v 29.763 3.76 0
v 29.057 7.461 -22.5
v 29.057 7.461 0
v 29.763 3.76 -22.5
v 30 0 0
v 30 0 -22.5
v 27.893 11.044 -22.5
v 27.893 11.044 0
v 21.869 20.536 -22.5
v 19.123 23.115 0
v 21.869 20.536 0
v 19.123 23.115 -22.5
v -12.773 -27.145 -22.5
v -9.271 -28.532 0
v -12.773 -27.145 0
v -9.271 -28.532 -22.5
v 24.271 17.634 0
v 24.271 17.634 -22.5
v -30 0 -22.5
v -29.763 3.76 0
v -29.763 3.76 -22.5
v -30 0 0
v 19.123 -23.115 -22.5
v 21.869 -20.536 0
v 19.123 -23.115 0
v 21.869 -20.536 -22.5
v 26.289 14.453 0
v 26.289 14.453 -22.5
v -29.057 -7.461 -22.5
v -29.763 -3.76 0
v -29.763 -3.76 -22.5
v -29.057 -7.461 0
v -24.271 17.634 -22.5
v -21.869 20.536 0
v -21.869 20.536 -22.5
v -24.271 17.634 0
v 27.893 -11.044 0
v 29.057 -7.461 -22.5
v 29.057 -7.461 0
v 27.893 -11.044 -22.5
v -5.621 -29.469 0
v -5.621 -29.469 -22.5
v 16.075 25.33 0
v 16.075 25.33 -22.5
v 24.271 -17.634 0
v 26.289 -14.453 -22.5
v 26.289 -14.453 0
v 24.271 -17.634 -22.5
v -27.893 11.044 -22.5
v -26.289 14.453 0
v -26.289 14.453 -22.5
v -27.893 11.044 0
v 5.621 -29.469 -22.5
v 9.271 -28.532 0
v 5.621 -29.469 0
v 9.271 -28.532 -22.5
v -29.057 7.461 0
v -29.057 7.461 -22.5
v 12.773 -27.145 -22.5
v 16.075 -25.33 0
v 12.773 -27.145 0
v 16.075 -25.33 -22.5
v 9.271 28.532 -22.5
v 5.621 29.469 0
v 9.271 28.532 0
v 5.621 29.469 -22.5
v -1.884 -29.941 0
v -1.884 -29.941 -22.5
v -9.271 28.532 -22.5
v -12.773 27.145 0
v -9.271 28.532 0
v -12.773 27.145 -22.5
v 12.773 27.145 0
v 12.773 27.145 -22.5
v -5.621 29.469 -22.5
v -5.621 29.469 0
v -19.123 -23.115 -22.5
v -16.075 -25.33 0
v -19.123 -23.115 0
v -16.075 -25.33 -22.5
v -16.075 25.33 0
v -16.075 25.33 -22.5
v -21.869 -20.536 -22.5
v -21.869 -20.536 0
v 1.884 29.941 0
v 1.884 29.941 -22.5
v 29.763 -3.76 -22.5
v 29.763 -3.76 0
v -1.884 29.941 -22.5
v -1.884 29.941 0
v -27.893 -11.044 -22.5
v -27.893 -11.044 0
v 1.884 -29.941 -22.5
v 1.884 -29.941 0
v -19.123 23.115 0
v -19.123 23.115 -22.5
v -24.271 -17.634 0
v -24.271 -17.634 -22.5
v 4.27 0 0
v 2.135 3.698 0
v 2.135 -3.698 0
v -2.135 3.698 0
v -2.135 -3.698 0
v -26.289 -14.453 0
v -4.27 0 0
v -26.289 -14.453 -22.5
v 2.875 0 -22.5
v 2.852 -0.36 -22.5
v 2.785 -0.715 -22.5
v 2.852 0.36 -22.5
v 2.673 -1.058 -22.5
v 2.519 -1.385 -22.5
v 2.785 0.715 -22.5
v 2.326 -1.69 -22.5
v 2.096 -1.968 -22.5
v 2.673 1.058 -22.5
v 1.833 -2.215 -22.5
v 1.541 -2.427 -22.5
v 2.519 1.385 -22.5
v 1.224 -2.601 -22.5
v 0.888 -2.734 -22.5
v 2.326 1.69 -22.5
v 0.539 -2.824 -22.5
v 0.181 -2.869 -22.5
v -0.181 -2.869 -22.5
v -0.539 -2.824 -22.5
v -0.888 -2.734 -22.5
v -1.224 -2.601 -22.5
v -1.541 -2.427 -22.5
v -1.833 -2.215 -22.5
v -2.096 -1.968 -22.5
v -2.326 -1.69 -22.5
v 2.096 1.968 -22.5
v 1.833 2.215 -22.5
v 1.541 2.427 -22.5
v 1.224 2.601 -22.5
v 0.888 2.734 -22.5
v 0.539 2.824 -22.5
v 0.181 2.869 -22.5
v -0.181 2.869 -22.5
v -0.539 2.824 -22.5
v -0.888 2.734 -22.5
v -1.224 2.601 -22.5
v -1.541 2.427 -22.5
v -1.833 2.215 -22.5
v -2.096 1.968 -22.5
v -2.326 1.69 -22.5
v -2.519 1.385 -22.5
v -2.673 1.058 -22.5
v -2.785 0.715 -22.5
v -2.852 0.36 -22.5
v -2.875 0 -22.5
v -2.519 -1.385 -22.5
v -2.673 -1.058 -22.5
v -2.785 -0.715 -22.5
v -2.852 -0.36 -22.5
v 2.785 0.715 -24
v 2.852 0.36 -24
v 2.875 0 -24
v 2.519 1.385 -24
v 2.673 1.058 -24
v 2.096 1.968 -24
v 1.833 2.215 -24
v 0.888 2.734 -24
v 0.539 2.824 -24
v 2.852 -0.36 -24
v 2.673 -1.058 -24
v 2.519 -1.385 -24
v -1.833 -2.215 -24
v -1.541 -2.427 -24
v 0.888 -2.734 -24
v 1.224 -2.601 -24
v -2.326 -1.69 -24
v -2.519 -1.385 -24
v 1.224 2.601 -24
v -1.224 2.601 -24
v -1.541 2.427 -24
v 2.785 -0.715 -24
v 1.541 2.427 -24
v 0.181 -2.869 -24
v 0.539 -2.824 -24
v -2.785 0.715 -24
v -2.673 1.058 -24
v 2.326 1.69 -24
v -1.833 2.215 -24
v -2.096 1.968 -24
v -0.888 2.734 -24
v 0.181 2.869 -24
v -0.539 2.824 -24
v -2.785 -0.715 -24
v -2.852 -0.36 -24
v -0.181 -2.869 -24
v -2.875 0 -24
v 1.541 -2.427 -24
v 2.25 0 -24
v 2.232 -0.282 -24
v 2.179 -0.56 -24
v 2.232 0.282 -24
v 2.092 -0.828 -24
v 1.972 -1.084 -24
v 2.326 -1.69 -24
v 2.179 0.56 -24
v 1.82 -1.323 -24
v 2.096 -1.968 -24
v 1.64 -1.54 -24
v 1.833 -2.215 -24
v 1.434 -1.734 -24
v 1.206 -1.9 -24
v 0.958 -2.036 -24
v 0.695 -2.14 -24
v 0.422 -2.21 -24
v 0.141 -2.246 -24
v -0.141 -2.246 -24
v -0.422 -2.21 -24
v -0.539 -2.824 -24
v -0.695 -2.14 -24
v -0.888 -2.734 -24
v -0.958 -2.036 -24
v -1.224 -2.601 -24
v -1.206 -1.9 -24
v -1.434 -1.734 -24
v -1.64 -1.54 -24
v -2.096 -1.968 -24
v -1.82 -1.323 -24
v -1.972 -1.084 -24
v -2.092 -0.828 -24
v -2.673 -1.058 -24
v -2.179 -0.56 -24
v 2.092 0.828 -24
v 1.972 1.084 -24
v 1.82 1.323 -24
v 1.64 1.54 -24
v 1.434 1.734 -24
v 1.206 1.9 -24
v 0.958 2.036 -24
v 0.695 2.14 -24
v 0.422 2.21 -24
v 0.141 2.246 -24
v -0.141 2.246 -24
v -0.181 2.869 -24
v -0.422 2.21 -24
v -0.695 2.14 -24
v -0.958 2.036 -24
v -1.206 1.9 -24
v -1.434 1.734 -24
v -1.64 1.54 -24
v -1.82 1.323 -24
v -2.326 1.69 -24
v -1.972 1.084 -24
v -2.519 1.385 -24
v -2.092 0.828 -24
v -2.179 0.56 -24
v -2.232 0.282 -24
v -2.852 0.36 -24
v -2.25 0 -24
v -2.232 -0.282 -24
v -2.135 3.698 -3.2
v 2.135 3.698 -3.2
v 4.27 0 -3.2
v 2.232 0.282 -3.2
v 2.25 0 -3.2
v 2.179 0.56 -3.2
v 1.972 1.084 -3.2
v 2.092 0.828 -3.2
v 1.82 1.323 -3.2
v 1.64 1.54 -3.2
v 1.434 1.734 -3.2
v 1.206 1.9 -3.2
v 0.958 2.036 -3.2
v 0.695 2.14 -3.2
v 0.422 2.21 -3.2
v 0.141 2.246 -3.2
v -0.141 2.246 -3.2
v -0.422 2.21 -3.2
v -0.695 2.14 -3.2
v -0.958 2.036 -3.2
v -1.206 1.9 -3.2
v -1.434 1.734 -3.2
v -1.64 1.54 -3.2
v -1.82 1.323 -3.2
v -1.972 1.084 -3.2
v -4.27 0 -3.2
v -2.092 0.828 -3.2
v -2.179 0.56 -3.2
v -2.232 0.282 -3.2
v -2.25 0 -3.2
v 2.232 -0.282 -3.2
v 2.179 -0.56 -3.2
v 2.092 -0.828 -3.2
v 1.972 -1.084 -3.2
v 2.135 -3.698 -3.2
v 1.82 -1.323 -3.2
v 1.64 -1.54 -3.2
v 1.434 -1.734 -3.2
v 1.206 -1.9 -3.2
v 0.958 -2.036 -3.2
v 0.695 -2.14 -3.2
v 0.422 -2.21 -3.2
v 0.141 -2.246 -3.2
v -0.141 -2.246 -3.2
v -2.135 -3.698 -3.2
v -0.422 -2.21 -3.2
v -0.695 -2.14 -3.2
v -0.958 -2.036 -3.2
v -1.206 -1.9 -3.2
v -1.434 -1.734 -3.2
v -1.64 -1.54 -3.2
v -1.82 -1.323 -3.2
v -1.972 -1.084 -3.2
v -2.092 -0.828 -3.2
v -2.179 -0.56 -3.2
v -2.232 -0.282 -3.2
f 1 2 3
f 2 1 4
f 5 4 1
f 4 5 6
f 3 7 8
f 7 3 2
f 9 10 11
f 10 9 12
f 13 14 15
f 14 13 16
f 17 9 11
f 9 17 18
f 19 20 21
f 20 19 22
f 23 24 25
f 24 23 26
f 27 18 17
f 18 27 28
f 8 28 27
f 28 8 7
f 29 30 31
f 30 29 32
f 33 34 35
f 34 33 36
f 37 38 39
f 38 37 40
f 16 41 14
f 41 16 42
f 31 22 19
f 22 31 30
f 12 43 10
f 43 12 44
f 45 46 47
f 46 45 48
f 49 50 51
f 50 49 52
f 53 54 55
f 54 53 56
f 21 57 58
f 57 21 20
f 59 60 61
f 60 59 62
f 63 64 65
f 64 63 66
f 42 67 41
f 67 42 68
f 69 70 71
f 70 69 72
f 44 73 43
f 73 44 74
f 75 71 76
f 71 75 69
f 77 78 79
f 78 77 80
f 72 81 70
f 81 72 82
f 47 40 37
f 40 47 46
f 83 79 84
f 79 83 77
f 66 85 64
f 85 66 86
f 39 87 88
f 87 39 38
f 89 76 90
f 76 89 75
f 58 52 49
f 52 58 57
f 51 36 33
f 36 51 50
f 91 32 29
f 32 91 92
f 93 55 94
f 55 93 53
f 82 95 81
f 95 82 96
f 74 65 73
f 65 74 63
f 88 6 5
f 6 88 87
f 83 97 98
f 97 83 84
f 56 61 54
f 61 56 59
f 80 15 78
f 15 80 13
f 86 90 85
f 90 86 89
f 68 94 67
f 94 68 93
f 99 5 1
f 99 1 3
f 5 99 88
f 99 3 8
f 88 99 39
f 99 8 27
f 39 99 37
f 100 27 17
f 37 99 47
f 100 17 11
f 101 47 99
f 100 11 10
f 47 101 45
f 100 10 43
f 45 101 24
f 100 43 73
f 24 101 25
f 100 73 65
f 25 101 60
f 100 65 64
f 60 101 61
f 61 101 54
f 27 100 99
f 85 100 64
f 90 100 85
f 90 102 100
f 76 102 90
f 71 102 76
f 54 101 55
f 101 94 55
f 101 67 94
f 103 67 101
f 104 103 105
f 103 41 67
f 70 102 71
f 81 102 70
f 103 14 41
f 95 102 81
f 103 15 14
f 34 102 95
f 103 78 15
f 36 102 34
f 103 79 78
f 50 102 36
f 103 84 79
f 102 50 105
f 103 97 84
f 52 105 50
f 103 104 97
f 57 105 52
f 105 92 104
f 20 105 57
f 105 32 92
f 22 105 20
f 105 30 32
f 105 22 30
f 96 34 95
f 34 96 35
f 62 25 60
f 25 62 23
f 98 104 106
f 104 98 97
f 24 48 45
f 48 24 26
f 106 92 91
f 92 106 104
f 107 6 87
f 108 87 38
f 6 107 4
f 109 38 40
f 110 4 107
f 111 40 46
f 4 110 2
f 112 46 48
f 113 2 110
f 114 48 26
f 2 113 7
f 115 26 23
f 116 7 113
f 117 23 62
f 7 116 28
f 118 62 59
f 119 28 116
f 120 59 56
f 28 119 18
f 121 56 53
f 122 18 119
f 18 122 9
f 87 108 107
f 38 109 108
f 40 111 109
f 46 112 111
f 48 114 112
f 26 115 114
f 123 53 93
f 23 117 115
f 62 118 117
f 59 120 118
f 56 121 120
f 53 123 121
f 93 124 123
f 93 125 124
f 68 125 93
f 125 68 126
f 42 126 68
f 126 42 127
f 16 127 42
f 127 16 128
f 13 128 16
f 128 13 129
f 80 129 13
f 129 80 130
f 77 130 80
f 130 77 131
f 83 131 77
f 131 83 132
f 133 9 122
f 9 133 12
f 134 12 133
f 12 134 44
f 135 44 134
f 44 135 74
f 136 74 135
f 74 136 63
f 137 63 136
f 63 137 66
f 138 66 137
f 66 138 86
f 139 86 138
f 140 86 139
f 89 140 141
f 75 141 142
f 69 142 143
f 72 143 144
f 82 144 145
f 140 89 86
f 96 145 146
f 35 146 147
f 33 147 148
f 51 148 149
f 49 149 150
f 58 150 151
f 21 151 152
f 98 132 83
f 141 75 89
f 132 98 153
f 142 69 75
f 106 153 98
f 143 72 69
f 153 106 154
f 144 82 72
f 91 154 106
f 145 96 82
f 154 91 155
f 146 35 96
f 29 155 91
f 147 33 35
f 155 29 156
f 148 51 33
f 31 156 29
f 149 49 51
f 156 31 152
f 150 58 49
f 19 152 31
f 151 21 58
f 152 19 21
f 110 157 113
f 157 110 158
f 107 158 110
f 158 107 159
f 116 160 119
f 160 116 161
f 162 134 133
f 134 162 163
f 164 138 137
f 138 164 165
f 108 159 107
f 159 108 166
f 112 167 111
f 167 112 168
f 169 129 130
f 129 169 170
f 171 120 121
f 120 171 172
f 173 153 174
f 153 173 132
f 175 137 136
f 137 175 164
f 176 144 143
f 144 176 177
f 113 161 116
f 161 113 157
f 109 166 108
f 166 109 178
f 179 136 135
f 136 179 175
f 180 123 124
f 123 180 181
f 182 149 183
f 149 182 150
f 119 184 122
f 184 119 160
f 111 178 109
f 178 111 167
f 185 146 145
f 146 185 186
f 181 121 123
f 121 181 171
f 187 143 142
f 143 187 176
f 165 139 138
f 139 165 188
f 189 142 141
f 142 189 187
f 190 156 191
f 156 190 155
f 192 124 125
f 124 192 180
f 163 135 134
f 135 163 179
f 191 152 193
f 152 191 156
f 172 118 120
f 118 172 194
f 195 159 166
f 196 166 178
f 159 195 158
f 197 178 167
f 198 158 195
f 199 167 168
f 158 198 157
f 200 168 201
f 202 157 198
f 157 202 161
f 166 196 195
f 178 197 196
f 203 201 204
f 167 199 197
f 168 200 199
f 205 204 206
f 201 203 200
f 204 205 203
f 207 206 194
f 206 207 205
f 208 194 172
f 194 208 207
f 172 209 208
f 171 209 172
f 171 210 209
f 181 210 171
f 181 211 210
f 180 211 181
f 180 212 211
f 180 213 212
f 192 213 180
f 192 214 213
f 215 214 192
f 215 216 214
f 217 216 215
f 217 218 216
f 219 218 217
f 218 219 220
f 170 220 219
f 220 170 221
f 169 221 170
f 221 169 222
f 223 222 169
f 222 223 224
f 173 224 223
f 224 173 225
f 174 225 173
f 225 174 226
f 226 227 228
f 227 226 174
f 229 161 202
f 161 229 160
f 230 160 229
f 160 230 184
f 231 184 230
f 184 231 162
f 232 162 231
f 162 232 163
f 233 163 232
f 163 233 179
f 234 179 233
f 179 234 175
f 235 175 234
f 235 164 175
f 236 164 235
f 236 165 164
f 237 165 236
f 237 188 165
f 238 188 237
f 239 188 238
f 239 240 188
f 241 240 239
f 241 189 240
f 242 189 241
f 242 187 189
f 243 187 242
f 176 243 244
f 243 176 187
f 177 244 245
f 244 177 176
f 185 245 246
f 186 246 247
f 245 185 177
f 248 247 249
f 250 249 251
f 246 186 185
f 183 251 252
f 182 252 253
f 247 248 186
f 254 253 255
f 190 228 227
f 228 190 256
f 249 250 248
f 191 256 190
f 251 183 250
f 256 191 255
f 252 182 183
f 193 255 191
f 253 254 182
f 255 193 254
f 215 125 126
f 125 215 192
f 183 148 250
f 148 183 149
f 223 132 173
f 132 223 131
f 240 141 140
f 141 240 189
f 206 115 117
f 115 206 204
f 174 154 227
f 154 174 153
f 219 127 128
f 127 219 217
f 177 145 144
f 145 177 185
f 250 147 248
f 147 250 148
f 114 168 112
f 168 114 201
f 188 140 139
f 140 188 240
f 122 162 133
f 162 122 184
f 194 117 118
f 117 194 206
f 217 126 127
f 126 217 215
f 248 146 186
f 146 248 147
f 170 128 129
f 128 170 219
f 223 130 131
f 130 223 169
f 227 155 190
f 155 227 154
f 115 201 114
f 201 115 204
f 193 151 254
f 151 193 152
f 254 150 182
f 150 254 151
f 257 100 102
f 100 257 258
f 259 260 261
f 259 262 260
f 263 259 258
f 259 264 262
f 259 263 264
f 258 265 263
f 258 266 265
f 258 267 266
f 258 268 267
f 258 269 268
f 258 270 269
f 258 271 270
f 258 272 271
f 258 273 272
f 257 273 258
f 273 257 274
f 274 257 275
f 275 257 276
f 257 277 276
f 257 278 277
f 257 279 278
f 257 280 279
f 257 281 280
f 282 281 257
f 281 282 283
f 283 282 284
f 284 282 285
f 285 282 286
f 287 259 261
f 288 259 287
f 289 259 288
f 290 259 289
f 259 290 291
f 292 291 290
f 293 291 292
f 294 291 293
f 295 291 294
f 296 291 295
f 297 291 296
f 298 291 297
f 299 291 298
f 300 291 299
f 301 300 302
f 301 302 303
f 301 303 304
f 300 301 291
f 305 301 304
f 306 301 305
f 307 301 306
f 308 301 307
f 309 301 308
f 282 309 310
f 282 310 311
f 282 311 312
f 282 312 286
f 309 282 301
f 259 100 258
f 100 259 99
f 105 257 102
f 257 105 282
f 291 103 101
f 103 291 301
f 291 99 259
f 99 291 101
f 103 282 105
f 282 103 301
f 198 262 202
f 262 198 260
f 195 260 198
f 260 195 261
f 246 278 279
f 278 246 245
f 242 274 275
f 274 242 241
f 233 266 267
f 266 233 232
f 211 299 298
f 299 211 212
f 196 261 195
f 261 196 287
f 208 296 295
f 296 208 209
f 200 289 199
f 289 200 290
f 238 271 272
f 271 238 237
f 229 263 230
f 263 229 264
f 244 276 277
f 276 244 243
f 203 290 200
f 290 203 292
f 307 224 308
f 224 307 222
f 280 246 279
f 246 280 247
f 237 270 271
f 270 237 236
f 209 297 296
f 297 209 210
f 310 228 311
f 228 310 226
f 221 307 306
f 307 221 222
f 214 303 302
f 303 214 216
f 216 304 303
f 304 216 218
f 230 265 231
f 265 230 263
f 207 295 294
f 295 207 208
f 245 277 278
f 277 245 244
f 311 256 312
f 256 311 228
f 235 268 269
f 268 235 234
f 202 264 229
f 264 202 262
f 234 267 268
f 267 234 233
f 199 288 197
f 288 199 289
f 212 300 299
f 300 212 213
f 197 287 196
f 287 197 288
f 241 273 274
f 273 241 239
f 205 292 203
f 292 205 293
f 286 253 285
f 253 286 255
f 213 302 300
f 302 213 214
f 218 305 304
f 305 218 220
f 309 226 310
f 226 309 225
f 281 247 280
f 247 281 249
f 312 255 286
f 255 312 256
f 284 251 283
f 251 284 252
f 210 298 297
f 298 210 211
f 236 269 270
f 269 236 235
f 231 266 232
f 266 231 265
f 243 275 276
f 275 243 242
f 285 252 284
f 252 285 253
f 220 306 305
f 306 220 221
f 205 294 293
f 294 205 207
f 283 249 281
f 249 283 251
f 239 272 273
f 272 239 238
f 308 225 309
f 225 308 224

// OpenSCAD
$fn = 50;


difference() {
	union() {
		translate(v = [0, 0, -22.5000000000]) {
			cylinder(h = 22.5000000000, r = 30.0000000000);
		}
		#translate(v = [0, 0, -24.0000000000]) {
			cylinder(h = 24, r = 2.8750000000);
		}
	}
	union() {
		translate(v = [0, 0, 0]) {
			rotate(a = [0, 0, 0]) {
				difference() {
					union() {
						translate(v = [0, 0, -3.2000000000]) {
							linear_extrude(height = 3.2000000000) {
								polygon(points = [[4.2698000000, 0.0000000000], [2.1349000000, 3.6977552691], [-2.1349000000, 3.6977552691], [-4.2698000000, 0.0000000000], [-2.1349000000, -3.6977552691], [2.1349000000, -3.6977552691]]);
							}
						}
					}
					union();
				}
			}
		}
		#translate(v = [0, 0, -100.0000000000]) {
			cylinder(h = 200, r = 2.2500000000);
		}
	}
}
